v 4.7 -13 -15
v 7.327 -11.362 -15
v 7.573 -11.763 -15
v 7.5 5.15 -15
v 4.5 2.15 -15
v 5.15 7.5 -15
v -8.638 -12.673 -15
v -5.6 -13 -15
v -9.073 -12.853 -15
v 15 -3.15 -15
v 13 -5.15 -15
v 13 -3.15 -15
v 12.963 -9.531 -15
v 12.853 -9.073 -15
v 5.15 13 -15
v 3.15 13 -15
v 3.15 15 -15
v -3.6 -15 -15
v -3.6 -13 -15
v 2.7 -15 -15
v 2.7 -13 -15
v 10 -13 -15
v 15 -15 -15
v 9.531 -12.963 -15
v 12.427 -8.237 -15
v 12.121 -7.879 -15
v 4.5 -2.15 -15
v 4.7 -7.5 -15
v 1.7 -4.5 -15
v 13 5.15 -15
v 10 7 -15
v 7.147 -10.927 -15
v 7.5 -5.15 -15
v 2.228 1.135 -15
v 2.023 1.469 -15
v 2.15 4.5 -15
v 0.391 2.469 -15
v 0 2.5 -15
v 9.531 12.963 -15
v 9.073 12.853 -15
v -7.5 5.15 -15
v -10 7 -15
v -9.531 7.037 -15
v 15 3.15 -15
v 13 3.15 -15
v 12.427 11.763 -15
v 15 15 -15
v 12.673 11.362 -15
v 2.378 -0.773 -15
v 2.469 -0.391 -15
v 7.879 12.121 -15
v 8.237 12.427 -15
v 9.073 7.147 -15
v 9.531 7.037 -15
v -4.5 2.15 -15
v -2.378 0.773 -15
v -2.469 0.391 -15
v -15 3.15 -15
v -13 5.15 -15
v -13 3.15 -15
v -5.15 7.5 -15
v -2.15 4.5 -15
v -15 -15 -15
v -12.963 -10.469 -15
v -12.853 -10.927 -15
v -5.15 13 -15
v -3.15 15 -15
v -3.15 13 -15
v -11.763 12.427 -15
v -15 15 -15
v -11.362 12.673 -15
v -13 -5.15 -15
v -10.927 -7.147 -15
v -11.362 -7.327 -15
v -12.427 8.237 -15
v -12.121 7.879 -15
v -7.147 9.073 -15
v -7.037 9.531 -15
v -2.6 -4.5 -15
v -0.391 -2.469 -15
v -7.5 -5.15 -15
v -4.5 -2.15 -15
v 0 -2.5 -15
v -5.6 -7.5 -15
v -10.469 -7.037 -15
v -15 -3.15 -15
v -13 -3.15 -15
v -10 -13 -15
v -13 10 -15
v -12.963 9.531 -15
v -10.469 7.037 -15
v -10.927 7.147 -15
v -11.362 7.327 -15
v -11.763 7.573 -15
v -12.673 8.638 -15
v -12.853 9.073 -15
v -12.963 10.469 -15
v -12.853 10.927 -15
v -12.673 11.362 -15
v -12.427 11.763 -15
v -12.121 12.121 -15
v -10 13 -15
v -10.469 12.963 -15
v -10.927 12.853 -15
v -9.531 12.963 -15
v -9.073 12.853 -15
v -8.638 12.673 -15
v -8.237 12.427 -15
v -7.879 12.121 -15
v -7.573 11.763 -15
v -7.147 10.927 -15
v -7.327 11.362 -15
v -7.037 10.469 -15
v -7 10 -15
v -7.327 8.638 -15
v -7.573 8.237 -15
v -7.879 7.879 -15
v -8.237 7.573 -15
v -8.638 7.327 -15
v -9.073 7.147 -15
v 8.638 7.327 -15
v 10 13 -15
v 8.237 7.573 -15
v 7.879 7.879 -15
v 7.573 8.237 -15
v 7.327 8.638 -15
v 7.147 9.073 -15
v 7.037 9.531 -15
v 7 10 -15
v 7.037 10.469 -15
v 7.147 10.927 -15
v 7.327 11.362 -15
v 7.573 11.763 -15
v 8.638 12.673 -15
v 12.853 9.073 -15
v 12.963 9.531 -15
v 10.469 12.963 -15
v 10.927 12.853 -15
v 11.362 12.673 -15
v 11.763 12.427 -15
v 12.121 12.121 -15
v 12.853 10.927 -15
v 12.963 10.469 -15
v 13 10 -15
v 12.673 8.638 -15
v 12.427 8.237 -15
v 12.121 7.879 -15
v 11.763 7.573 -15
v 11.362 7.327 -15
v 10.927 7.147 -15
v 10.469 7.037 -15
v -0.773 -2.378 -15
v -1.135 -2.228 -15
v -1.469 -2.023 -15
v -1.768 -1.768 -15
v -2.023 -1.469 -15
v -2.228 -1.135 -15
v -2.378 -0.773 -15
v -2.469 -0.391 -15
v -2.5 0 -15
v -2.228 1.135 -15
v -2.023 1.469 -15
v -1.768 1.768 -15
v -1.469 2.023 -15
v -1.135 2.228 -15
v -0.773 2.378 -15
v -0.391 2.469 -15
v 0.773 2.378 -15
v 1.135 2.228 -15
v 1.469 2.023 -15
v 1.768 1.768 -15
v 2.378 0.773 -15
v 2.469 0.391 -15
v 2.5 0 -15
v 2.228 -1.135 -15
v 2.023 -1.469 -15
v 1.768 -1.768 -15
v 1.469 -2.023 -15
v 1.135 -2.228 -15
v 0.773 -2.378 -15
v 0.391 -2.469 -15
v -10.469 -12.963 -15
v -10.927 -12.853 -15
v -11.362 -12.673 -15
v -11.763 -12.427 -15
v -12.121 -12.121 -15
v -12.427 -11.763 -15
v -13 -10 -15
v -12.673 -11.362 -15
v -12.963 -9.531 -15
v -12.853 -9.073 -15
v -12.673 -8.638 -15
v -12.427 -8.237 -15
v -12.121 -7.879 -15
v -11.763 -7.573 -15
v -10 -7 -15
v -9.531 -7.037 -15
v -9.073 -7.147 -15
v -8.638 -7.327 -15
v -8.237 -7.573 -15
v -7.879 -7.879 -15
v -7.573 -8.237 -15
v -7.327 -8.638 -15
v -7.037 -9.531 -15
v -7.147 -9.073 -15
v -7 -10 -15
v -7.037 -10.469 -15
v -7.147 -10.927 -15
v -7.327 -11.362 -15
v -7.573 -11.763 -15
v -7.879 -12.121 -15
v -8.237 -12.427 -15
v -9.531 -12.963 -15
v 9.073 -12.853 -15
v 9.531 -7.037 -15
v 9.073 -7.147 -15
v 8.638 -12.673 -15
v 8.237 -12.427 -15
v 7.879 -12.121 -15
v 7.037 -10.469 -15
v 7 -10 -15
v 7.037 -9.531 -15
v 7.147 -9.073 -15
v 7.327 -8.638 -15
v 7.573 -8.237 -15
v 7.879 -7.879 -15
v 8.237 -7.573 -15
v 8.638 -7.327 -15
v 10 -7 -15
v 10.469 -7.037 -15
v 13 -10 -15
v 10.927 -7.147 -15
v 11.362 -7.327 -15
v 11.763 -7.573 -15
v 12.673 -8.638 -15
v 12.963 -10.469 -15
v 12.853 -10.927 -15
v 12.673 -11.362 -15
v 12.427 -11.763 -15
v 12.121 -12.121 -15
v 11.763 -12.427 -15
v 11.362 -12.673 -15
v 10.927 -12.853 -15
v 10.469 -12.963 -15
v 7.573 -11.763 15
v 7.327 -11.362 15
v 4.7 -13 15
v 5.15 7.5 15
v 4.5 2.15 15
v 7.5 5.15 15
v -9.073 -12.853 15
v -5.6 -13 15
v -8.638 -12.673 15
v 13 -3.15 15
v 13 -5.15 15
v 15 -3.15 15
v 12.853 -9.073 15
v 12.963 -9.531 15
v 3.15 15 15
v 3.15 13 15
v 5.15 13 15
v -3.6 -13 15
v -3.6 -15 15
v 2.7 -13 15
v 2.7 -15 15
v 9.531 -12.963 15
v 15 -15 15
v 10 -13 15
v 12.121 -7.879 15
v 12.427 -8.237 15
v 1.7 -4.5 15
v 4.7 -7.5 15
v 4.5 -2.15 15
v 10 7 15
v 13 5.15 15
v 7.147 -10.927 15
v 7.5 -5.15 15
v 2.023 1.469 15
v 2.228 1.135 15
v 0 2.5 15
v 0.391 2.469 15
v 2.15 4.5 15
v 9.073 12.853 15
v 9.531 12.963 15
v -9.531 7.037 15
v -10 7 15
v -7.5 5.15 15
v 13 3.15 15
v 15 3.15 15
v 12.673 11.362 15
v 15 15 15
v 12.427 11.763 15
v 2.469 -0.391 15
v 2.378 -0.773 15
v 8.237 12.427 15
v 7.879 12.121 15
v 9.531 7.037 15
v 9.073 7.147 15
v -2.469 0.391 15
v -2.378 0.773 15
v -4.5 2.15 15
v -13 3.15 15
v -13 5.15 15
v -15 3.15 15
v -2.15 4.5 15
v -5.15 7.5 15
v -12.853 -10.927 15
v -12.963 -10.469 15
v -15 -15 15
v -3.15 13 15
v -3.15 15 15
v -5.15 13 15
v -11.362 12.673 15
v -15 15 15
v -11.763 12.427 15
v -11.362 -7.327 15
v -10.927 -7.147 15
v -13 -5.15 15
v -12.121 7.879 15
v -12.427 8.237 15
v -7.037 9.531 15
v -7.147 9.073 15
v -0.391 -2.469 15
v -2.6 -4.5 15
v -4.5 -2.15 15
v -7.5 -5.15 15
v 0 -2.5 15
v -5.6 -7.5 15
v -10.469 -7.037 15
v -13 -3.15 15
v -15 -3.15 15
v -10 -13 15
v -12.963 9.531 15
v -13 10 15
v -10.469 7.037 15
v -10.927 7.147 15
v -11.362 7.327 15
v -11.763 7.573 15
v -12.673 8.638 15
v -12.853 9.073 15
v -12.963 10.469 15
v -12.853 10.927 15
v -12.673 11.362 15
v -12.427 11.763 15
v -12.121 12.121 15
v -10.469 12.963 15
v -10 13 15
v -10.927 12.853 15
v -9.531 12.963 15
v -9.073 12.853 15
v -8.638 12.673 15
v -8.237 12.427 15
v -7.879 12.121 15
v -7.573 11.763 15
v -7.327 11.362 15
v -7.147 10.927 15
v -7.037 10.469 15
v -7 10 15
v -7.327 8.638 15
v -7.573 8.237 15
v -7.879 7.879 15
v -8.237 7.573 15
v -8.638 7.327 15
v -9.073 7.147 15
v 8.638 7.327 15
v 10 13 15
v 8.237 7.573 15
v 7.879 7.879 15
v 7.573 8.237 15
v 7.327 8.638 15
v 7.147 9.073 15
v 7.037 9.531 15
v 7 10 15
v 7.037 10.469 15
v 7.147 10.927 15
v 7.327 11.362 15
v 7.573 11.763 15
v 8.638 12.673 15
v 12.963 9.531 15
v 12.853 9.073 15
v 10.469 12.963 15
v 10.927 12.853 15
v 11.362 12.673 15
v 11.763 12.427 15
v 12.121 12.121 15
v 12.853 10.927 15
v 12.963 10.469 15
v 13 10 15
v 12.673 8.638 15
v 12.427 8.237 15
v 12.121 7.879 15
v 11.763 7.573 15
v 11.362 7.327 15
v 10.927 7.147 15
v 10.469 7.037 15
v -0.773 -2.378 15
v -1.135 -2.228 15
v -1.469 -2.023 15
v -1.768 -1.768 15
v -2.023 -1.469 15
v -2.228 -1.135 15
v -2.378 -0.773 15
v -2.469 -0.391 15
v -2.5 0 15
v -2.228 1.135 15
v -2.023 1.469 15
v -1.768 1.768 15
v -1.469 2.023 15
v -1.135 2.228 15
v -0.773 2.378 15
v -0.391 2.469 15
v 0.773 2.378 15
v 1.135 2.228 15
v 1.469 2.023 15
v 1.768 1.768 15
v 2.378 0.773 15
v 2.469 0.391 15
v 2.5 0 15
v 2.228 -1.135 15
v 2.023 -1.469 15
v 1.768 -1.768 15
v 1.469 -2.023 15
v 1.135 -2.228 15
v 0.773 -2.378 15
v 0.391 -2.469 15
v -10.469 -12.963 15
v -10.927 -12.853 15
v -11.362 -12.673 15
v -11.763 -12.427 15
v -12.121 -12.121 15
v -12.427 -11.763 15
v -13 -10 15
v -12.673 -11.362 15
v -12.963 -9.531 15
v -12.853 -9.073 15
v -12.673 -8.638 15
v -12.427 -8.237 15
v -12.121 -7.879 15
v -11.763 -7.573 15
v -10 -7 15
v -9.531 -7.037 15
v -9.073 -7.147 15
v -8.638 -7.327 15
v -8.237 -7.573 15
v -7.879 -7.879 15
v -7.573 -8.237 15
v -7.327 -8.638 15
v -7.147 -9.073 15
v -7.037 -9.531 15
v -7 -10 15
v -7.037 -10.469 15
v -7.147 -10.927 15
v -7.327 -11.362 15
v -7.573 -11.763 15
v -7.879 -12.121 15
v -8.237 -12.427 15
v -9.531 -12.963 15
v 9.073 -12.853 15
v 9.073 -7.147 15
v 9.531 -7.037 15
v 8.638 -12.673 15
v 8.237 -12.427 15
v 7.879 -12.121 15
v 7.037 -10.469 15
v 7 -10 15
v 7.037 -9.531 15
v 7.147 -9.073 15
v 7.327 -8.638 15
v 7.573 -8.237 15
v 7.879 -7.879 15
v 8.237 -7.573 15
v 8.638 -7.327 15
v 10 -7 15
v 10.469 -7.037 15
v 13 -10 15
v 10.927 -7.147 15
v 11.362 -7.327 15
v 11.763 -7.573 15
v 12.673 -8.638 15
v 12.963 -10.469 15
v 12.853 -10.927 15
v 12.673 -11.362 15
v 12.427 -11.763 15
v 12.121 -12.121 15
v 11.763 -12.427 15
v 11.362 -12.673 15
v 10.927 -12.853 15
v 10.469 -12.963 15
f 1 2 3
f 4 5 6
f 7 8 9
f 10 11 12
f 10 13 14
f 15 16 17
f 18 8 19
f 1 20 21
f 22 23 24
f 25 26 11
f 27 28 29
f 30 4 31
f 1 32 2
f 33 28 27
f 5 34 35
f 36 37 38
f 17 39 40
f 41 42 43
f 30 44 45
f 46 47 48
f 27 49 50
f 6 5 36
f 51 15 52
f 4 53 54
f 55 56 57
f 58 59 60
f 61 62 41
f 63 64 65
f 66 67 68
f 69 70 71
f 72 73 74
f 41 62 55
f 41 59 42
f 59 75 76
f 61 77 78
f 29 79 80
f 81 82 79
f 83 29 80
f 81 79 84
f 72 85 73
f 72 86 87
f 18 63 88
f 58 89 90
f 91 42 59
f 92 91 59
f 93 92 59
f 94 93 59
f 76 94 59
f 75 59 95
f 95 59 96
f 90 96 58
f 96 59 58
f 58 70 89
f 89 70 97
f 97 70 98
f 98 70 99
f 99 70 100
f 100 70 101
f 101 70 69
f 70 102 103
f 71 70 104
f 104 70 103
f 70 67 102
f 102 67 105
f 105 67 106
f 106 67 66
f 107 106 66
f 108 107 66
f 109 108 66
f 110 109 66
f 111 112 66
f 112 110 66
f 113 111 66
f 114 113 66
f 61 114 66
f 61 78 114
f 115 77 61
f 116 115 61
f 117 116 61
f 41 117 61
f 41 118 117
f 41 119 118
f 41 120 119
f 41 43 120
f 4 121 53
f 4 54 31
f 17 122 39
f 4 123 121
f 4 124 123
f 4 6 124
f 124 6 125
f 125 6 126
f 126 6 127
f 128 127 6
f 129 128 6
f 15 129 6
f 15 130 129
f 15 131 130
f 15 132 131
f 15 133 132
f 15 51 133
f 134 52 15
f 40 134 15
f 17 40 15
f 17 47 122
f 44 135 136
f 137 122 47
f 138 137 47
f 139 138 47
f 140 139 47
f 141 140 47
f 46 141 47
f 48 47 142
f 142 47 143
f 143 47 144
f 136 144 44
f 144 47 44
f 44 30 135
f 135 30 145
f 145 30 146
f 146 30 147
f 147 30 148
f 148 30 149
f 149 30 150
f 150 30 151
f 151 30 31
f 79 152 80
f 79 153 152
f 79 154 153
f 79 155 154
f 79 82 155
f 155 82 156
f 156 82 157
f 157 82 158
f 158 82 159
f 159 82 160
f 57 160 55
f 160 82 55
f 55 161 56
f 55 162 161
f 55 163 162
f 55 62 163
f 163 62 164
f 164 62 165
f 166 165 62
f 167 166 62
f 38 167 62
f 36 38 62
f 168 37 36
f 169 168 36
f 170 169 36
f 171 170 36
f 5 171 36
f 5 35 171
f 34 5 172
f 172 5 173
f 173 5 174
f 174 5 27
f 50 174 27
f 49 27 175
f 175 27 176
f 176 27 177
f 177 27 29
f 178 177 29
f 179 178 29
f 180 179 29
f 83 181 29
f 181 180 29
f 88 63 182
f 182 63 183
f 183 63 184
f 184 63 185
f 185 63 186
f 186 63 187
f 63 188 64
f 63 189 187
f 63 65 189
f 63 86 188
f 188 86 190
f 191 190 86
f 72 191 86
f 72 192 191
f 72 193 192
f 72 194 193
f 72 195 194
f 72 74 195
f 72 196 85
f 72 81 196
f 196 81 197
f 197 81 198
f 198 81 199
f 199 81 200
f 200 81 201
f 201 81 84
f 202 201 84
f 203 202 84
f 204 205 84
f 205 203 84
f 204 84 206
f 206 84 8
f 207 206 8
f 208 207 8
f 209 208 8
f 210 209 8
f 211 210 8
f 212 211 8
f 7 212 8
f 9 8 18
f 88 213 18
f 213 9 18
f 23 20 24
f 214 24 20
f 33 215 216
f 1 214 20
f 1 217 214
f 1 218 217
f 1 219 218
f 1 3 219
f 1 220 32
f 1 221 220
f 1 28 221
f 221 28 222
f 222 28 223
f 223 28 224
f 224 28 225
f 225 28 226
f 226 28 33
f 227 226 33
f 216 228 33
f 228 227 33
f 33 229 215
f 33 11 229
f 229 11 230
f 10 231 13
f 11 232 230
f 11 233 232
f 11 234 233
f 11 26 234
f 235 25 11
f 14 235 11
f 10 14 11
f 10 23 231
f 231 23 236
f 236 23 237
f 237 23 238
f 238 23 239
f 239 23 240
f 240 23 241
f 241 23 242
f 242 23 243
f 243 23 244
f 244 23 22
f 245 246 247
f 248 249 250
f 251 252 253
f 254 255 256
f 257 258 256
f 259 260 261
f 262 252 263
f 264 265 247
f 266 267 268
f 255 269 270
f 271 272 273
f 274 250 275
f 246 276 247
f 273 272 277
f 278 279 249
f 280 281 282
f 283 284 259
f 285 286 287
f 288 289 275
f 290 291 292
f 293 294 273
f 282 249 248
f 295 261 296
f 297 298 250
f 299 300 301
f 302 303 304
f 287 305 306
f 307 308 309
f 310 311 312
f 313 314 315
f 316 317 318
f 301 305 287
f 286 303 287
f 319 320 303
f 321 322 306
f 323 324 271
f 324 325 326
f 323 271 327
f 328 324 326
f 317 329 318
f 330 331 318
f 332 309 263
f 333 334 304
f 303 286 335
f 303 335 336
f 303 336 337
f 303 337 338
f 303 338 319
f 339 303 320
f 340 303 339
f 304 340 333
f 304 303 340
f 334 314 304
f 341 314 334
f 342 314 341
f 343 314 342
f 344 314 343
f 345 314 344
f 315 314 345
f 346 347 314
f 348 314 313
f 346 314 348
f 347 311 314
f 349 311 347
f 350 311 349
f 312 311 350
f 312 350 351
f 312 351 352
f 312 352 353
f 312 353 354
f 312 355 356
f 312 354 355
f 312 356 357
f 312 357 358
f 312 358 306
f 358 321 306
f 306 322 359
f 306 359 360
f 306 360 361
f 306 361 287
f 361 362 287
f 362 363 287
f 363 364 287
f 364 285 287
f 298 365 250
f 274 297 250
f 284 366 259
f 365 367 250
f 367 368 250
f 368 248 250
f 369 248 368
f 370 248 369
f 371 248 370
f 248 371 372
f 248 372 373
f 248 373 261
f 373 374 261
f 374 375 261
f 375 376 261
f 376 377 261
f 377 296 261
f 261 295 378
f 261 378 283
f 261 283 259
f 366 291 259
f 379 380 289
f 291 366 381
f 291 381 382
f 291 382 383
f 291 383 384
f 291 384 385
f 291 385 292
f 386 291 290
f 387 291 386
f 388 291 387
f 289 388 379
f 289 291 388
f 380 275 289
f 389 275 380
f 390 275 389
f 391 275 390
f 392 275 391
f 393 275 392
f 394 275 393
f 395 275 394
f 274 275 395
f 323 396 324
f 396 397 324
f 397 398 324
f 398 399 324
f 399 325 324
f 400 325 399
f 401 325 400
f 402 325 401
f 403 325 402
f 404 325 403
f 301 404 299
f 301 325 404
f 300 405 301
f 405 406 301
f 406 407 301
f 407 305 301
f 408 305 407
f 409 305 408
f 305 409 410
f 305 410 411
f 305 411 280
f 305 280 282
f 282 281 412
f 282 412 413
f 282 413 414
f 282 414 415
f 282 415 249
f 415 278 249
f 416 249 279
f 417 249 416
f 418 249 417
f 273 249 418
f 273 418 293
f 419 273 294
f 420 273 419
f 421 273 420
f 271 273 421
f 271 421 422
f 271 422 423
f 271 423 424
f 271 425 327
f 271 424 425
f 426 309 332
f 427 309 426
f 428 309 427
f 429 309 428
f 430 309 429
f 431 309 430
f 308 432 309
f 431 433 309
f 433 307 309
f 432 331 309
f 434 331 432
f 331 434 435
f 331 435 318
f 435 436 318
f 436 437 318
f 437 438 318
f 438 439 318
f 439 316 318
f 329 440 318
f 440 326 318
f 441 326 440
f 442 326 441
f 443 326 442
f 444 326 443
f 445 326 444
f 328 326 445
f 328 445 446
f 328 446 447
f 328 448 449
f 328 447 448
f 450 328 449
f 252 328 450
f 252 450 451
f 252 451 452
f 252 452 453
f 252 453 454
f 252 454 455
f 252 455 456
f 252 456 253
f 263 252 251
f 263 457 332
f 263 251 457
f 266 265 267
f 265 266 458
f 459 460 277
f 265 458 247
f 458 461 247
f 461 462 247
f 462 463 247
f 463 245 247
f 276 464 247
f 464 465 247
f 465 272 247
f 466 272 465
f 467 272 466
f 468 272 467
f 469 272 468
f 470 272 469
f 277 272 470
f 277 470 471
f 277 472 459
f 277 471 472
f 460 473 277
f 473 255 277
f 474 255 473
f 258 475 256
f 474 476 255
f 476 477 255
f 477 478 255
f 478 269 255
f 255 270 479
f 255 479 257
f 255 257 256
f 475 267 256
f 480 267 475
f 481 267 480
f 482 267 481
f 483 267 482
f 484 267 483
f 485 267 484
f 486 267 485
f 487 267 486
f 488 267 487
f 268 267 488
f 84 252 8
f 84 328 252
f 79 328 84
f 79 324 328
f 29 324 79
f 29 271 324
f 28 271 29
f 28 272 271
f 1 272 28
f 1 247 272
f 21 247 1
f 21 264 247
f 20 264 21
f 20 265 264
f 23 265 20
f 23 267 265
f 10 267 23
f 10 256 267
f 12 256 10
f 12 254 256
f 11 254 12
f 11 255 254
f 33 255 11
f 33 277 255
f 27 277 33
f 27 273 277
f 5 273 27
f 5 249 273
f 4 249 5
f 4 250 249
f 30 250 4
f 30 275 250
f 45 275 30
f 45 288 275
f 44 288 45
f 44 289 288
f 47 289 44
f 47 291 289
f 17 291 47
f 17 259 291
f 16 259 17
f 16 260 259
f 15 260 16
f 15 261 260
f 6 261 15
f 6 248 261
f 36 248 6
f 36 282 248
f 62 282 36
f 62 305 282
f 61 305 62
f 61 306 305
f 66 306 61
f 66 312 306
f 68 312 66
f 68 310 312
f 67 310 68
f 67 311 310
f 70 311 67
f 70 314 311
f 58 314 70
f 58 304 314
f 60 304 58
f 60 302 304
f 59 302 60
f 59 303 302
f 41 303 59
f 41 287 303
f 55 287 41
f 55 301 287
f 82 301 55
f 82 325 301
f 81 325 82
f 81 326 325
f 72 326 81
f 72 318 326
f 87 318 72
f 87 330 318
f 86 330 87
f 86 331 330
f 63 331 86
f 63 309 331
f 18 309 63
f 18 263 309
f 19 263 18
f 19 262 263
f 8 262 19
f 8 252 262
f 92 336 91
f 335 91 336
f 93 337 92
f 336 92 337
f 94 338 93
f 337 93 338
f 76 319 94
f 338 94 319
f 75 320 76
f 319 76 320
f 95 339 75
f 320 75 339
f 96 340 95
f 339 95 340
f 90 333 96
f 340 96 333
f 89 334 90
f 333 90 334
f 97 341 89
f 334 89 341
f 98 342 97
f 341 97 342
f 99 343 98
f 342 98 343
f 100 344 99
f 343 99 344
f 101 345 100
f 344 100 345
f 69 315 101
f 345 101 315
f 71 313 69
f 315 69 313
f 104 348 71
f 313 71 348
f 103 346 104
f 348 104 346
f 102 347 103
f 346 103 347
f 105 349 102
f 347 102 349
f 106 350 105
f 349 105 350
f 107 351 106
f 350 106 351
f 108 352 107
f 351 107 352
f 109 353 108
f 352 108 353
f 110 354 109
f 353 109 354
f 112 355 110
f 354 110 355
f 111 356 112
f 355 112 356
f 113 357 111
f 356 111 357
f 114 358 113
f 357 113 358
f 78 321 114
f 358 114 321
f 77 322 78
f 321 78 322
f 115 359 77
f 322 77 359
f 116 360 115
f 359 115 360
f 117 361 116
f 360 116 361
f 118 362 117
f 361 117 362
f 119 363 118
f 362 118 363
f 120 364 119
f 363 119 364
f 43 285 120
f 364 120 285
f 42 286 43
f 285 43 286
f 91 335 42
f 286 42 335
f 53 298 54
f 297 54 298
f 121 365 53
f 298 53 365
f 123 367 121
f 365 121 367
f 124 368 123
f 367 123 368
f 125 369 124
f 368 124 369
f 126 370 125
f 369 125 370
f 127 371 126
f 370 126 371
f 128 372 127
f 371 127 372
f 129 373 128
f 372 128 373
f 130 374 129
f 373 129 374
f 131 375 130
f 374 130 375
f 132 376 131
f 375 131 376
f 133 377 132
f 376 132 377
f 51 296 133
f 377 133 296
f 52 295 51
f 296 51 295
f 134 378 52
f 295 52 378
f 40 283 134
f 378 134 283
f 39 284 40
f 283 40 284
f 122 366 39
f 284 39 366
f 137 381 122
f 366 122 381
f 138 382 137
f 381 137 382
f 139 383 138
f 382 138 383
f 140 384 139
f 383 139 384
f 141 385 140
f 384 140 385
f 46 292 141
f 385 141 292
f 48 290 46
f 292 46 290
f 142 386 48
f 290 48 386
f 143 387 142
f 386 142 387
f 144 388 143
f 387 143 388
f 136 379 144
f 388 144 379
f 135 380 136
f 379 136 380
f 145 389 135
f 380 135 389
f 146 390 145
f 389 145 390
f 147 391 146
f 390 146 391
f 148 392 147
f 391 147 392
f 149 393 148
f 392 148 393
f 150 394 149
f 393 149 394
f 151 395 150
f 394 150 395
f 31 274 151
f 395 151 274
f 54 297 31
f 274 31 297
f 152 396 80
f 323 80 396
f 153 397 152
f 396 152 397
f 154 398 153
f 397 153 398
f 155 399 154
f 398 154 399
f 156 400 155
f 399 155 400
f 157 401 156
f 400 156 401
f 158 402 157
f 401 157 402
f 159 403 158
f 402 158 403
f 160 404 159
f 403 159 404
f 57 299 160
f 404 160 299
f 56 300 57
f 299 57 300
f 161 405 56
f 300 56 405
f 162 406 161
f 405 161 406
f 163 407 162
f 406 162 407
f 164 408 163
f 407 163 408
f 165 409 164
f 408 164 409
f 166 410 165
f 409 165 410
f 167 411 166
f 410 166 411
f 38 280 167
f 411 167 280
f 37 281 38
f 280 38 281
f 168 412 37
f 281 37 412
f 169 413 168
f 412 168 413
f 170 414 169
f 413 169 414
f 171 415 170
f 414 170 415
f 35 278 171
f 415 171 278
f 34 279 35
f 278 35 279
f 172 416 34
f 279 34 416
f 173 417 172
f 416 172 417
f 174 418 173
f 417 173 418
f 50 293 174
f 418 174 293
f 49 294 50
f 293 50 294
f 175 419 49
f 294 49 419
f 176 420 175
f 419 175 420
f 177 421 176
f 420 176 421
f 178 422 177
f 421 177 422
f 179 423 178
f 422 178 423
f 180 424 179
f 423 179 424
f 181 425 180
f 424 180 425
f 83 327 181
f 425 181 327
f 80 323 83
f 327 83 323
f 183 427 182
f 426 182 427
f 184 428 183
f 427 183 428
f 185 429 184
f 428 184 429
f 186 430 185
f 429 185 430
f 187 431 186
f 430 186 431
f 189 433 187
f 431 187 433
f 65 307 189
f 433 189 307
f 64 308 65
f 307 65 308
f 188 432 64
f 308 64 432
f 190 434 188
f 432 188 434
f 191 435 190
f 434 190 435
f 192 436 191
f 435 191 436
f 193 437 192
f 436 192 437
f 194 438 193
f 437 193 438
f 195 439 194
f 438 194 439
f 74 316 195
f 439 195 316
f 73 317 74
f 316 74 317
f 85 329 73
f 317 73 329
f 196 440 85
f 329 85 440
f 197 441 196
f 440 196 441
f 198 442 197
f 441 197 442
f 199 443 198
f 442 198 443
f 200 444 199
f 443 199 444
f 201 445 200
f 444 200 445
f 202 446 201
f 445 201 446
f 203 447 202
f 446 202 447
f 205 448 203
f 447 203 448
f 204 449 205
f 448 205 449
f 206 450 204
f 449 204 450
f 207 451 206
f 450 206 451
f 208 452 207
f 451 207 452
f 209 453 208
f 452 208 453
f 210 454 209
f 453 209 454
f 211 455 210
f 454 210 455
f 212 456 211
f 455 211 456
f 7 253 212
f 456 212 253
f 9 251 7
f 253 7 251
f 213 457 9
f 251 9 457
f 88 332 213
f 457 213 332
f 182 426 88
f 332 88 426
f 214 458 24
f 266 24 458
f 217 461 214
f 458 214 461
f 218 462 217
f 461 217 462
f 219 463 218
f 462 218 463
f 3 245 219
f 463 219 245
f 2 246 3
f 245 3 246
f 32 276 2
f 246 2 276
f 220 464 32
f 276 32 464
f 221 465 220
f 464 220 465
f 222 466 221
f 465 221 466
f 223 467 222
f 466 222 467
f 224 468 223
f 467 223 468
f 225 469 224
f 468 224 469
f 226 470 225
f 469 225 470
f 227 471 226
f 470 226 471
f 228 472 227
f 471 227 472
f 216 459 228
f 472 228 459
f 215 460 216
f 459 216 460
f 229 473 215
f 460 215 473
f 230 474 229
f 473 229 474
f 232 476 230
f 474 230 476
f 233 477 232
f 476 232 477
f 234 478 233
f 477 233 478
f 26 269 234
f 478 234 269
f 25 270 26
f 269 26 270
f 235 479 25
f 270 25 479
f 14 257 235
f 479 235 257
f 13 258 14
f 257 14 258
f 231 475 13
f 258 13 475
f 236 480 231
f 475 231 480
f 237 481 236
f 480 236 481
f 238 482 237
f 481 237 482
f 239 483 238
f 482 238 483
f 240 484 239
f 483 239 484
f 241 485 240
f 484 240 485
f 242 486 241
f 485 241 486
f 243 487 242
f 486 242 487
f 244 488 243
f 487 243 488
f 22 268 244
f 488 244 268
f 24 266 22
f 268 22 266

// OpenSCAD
// file: ../library/Profile30.scad
// project		: mT-101
// parts 		: profile (profile30_width 30mm)
// printable 	: yes

// author 		: vincent
// date   		: 6.20.2013

// www.metarobotics.com
// It is licensed under the Creative Commons - GNU GPL license.

profile30_width=30;

//simple usage
//profile30(length=100,female=false);

module profile30_inner_slice()
{
	w1=10.3;
	w2=6.3;
	height=10.5;
	margin_corner=3;
	marginy=2;

	margin2 = (w1-w2)/2;
	array1=[[0,height],[0,height-marginy],[margin2,height-marginy],[margin2,height]];
	array2=[[w1,height],[w1,height-marginy],[w1-margin2,height-marginy],[w1-margin2,height]];

	difference()
	{
		polygon(points=[[0,0],[w1,0],[w1,height],[0,height]]);
		polygon(points=[[0,0],[0,margin_corner],[margin_corner,0]]);
		polygon(points=[[w1,0],[w1,margin_corner],[w1-margin_corner,0]]);
		polygon(points=array1);
		polygon(points=array2);
	}
}

module profile_slice30(length=100,female=true)
{
	inner_w=20;
	hole_dia=3;
	center_dia=5;

	margin1=(profile30_width-inner_w)/2;
	margin2=4;
	inner_slice_w=10.3;
	inner_slice_h=10.5;
	socket_length=6;

	translate([-profile30_width/2,-profile30_width/2,0])
	linear_extrude(height=length,center=true)
	difference()
	{
		square(profile30_width,profile30_width);
		translate([profile30_width/2-inner_slice_w/2,profile30_width-inner_slice_h,0]) profile30_inner_slice();
		translate([inner_slice_h,profile30_width/2-inner_slice_w/2,0]) rotate([0,0,90]) profile30_inner_slice();
		translate([profile30_width-inner_slice_w,inner_slice_h,0]) rotate([0,0,180]) profile30_inner_slice();
		translate([profile30_width-inner_slice_h,profile30_width/2+inner_slice_w/2,0]) rotate([0,0,270]) profile30_inner_slice();

		//hole
		translate([margin1,margin1]) circle(r=hole_dia);
		translate([margin1,profile30_width-margin1]) circle(r=hole_dia);
		translate([profile30_width-margin1,margin1]) circle(r=hole_dia);
		translate([profile30_width-margin1,profile30_width-margin1]) circle(r=hole_dia);
		translate([profile30_width/2,profile30_width/2]) circle(r=center_dia/2);
	}

	if(female==false)
	{
		//socket
		translate([-profile30_width/2,-profile30_width/2,length/2])
		difference()
		{
			union()
			{
				linear_extrude(height=2*socket_length,center=true)
				union()
				{
					translate([margin1,margin1]) circle(r=hole_dia);
					translate([margin1,profile30_width-margin1]) circle(r=hole_dia);
					translate([profile30_width-margin1,margin1]) circle(r=hole_dia);
					translate([profile30_width-margin1,profile30_width-margin1]) circle(r=hole_dia);
				}

				translate([0,0,socket_length])
				union()
				{
					translate([margin1,margin1]) cylinder(h=socket_length/2,r1=hole_dia,r2=hole_dia/2);
					translate([margin1,profile30_width-margin1]) cylinder(h=socket_length/2,r1=hole_dia,r2=hole_dia/2);
					translate([profile30_width-margin1,margin1]) cylinder(h=socket_length/2,r1=hole_dia,r2=hole_dia/2);
					translate([profile30_width-margin1,profile30_width-margin1]) cylinder(h=socket_length/2,r1=hole_dia,r2=hole_dia/2);
				}
			}

			translate([0,0,-socket_length-0.01])
			union()
			{
				translate([margin1,margin1]) cylinder(h=socket_length/2,r1=hole_dia,r2=hole_dia/2);
				translate([margin1,profile30_width-margin1]) cylinder(h=socket_length/2,r1=hole_dia,r2=hole_dia/2);
				translate([profile30_width-margin1,margin1]) cylinder(h=socket_length/2,r1=hole_dia,r2=hole_dia/2);
				translate([profile30_width-margin1,profile30_width-margin1]) cylinder(h=socket_length/2,r1=hole_dia,r2=hole_dia/2);
			}
		}
	}
}

module profile30(length=100,female=true,isPrintable=true) {
	$fa = 1;
	$fn = 40;
	profile_slice30(length=length,female=female);
}
// main file
// project		: mT-101
// parts 		: profile (width 30mm)
// printable 	: yes

// author 		: vincent
// date   		: 6.20.2013

// www.metarobotics.com
// It is licensed under the Creative Commons - GNU GPL license.

//simple usage
//profile30(length=100,female=false);

include <../library/Profile30.scad>

profile30(length=30,female=true);
